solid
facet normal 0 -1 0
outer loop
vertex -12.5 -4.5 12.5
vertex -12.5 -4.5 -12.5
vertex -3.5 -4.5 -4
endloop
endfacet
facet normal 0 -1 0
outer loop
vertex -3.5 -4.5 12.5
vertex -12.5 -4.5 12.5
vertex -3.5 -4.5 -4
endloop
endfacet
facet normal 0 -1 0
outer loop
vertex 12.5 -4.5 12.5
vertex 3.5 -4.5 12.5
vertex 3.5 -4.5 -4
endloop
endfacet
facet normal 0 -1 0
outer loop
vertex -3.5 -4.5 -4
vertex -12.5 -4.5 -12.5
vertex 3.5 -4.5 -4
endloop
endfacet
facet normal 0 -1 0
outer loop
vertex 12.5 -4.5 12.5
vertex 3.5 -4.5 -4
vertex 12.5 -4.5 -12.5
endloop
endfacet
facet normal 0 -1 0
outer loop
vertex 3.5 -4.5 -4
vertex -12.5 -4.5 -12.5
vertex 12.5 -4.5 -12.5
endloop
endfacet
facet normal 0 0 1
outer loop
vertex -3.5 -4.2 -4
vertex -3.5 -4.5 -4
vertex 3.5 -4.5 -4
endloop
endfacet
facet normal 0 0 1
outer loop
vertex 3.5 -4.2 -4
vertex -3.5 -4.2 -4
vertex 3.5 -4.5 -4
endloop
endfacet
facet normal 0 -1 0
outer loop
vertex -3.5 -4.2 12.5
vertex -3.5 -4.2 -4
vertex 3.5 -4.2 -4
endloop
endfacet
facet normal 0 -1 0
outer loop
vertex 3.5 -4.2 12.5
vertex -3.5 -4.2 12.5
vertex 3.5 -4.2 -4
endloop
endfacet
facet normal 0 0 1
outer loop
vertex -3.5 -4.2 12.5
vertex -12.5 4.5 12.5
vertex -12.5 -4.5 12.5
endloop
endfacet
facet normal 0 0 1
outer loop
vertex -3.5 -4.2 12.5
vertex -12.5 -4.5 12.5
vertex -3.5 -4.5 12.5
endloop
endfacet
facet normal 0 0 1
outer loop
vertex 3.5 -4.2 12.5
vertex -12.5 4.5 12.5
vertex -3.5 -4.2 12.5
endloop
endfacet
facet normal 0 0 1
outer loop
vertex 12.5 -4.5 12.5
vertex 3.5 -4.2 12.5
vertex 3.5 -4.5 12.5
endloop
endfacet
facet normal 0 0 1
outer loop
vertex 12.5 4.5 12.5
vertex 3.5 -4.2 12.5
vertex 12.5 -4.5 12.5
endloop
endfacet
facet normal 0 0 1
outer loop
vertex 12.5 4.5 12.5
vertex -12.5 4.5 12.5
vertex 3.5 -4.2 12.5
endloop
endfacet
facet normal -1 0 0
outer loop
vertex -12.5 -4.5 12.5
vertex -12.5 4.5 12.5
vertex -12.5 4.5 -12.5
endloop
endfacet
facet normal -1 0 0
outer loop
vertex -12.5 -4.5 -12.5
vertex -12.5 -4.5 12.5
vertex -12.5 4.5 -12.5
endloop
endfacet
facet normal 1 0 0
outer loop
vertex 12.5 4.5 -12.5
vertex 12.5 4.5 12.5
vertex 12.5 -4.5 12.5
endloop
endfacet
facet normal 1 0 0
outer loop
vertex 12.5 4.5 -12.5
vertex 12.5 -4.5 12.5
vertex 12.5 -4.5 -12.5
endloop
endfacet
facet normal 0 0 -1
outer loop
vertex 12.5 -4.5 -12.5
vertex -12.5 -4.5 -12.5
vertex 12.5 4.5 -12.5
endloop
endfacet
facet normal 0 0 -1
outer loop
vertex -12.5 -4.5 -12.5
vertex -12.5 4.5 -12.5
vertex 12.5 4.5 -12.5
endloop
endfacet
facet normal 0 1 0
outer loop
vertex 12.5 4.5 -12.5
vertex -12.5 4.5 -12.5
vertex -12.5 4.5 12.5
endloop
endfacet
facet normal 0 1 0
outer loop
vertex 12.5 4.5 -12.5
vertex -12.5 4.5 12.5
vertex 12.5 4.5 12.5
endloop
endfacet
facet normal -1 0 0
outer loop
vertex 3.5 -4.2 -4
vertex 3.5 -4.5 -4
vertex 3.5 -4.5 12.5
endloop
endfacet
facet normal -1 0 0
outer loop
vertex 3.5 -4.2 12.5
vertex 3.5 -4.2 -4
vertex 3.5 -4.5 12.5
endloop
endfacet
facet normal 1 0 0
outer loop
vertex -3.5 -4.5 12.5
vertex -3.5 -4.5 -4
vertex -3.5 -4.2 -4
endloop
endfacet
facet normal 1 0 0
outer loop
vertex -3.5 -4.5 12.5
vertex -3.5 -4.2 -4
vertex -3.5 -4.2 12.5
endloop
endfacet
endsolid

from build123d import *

# Parameters (mm, degrees)
SKETCH1_W           = 25
SKETCH1_H           = 25
BOSS_EXTRUDE1_DEPTH = 4.5
SKETCH2_W           = 7
SKETCH2_H           = 16.5
CUT_EXTRUDE1_DEPTH  = 0.3


with BuildPart() as part:
    # Sketch1 → Boss-Extrude1 (new, symmetric)
    with BuildSketch(Plane(origin=(0, 0, 0), x_dir=(1, 0, 0), z_dir=(0, 1, 0))):
        Rectangle(SKETCH1_W, SKETCH1_H)
    extrude(amount=BOSS_EXTRUDE1_DEPTH, both=True)

    # Sketch2 → Cut-Extrude1 (cut)
    with BuildSketch(Plane.XZ.offset(4.5)):
        with Locations((0, 4.25)):
            Rectangle(SKETCH2_W, SKETCH2_H)
    extrude(amount=-CUT_EXTRUDE1_DEPTH, mode=Mode.SUBTRACT)


solid = part.part
